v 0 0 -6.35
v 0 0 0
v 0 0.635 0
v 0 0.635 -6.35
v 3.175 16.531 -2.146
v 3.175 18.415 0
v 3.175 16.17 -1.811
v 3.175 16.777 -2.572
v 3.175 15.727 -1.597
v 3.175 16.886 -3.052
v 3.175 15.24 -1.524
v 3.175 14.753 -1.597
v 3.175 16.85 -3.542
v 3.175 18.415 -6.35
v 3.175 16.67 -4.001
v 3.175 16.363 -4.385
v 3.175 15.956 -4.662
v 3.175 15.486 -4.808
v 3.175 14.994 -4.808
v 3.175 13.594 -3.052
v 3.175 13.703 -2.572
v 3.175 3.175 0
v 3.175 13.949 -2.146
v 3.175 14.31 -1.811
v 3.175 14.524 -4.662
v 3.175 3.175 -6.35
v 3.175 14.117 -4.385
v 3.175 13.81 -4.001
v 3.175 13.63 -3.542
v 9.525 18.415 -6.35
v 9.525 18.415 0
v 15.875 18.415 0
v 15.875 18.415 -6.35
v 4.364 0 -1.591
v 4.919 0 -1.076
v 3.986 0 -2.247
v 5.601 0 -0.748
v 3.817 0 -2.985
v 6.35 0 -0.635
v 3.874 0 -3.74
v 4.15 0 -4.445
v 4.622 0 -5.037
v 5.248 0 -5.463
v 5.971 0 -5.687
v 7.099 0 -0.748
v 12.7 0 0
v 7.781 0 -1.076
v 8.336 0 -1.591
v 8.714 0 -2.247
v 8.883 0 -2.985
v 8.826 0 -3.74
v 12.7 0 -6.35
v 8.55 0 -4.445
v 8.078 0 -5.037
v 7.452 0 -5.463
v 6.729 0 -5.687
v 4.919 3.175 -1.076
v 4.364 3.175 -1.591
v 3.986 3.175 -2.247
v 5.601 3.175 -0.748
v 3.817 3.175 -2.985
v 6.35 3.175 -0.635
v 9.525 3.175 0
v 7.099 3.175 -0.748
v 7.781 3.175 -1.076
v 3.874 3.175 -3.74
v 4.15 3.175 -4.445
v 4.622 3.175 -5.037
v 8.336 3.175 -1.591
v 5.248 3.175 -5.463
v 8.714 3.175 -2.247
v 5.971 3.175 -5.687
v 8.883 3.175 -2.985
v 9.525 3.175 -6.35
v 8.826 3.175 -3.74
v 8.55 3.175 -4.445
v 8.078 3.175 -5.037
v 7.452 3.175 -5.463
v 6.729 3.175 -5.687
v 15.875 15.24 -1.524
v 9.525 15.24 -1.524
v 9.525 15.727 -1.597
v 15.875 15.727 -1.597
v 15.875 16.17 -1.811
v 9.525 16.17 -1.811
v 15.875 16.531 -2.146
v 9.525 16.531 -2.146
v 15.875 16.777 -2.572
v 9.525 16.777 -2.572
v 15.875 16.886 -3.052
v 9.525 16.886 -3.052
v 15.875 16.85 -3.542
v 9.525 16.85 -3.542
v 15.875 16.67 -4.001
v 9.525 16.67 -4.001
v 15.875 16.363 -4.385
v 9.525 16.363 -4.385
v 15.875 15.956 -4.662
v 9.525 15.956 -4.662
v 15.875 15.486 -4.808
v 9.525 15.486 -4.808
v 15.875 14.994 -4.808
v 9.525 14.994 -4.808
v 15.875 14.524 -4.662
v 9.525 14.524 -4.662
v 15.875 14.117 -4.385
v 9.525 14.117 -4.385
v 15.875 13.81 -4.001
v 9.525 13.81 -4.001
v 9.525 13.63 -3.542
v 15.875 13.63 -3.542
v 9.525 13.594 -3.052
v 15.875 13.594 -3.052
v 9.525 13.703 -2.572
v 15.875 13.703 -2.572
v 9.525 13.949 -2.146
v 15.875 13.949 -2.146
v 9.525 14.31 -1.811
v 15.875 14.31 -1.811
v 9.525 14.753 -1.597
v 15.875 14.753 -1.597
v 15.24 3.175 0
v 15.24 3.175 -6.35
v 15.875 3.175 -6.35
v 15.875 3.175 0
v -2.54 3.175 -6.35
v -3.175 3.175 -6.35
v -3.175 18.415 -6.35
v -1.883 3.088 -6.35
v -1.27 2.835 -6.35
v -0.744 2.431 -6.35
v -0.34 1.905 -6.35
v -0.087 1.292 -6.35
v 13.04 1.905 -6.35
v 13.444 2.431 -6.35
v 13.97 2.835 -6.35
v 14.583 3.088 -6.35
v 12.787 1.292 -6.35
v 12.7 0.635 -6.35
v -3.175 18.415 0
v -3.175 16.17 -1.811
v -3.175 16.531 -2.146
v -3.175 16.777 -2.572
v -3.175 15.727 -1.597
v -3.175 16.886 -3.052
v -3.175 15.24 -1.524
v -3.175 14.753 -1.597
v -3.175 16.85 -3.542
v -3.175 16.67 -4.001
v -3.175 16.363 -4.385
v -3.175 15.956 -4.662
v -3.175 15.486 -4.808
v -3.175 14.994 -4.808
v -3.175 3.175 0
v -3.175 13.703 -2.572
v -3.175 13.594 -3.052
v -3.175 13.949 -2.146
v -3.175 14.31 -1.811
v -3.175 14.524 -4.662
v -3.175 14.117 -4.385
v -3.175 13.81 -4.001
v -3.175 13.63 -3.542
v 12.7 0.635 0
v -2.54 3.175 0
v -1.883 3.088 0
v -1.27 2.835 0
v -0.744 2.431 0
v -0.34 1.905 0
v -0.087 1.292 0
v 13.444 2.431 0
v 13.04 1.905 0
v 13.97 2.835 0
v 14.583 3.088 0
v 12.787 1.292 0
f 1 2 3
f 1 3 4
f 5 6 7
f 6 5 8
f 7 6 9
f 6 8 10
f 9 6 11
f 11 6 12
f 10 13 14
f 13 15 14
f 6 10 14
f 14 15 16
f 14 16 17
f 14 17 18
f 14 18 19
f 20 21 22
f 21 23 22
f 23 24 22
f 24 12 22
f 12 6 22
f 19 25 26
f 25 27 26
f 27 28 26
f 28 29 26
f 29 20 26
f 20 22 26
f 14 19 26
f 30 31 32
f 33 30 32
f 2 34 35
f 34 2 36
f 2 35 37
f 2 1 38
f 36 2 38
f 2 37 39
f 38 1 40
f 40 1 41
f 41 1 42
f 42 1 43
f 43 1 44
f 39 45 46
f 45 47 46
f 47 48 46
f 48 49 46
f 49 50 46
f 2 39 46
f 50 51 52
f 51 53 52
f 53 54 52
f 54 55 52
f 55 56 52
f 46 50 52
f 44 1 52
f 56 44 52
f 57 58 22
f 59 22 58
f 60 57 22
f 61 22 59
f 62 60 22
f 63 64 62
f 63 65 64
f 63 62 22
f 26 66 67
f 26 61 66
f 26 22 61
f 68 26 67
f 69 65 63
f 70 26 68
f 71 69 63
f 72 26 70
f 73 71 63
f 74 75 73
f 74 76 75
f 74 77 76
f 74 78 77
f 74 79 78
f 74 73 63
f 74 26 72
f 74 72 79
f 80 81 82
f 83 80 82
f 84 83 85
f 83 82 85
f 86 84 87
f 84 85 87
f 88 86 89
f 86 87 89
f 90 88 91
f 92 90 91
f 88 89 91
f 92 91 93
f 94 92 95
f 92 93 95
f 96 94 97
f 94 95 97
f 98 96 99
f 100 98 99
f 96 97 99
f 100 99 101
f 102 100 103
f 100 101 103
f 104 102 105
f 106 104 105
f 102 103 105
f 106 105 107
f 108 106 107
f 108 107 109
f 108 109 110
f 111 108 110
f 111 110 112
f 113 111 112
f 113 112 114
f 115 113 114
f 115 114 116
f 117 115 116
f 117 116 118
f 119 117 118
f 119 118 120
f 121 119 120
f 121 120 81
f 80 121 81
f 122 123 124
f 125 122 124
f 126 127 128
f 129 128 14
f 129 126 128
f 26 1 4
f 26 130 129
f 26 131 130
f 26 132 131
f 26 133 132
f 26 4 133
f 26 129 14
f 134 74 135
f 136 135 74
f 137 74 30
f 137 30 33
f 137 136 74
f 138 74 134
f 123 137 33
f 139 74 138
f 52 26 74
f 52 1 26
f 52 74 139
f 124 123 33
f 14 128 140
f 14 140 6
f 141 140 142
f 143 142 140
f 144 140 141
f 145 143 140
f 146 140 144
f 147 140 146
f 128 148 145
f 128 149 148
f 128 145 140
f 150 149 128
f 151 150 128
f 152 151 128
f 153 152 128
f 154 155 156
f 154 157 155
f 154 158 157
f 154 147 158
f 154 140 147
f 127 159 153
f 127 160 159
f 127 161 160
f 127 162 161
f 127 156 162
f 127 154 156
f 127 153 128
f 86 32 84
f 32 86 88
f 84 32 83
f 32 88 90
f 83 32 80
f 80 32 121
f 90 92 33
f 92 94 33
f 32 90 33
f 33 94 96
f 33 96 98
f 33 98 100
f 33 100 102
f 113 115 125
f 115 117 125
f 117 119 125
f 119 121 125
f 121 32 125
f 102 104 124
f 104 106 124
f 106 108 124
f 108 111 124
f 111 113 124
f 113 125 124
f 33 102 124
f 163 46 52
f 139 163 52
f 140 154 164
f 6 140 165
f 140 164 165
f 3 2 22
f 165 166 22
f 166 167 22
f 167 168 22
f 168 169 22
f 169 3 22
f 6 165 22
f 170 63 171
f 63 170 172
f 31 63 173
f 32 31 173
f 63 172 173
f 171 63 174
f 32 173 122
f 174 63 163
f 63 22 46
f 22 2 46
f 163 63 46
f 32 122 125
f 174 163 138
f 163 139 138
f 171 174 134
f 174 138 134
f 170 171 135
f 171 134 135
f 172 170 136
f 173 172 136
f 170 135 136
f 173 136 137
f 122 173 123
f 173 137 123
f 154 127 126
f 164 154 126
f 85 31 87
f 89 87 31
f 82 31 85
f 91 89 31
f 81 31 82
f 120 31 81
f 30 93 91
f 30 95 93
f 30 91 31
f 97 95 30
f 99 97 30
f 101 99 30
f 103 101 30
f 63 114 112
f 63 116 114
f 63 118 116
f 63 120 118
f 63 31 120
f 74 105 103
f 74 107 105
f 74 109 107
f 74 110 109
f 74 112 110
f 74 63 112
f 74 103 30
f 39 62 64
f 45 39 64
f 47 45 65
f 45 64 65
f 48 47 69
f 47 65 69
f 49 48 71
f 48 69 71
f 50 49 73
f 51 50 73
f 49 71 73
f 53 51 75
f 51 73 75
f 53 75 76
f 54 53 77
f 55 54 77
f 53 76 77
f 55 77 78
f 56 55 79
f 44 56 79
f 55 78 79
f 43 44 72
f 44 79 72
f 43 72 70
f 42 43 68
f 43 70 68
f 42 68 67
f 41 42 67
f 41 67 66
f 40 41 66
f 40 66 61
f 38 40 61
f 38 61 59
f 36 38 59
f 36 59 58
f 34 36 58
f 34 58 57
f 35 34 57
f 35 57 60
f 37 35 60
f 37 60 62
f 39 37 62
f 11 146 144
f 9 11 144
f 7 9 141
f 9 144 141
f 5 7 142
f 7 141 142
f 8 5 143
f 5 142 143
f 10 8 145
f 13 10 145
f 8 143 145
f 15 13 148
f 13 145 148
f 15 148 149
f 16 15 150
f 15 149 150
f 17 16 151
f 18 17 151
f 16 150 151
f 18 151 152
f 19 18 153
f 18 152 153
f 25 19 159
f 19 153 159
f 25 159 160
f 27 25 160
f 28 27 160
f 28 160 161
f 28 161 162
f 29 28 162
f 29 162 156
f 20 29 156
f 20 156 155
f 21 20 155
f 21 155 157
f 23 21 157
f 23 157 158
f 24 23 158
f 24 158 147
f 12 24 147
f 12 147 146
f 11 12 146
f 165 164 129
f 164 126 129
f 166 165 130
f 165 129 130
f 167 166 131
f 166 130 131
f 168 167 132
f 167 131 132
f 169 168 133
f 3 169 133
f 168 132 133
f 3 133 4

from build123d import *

# Parameters (mm, degrees)
SKETCH1_W           = 12.7
SKETCH1_H           = 6.35
BOSS_EXTRUDE1_DEPTH = 3.175
SKETCH2_W           = 6.35
SKETCH2_H           = 6.35
BOSS_EXTRUDE2_DEPTH = 15.24
FILLET1_R           = 2.54
SKETCH3_R           = 1.651
CUT_EXTRUDE1_DEPTH  = 22.606
SKETCH4_R           = 2.54
CUT_EXTRUDE2_DEPTH  = 22.606


with BuildPart() as part:
    # Sketch1 → Boss-Extrude1 (new body)
    with BuildSketch(Plane(origin=(0, 0, 0), x_dir=(1, 0, 0), z_dir=(0, 1, 0))):
        with Locations((6.35, 3.175)):
            Rectangle(SKETCH1_W, SKETCH1_H)
    extrude(amount=BOSS_EXTRUDE1_DEPTH)

    # Sketch2 → Boss-Extrude2 (add)
    with BuildSketch(Plane(origin=(0, 3.175, 0), x_dir=(1, 0, 0), z_dir=(0, 1, 0))):
        with Locations((0, 3.175)):
            Rectangle(SKETCH2_W, SKETCH2_H)
        with Locations((12.7, 3.175)):
            Rectangle(SKETCH2_W, SKETCH2_H)
    extrude(amount=BOSS_EXTRUDE2_DEPTH)

    # Fillet1
    fillet1_edges = [part.edges().sort_by_distance(p)[0] for p in [
        (12.7, 3.175, -3.175),
        (0, 3.175, -3.175),
    ]]
    fillet(fillet1_edges, radius=FILLET1_R)

    # Sketch3 → Cut-Extrude1 (cut)
    with BuildSketch(Plane.ZY.offset(3.175)):
        with Locations((-3.175, 15.24)):
            Circle(SKETCH3_R)
    extrude(amount=-CUT_EXTRUDE1_DEPTH, mode=Mode.SUBTRACT)

    # Sketch4 → Cut-Extrude2 (cut)
    with BuildSketch(Plane(origin=(0, 3.175, 0), x_dir=(1, 0, 0), z_dir=(0, 1, 0))):
        with Locations(Location((6.35, 3.175, 0), (0, 0, 270))):
            Circle(SKETCH4_R)
    extrude(amount=-CUT_EXTRUDE2_DEPTH, mode=Mode.SUBTRACT)


solid = part.part
